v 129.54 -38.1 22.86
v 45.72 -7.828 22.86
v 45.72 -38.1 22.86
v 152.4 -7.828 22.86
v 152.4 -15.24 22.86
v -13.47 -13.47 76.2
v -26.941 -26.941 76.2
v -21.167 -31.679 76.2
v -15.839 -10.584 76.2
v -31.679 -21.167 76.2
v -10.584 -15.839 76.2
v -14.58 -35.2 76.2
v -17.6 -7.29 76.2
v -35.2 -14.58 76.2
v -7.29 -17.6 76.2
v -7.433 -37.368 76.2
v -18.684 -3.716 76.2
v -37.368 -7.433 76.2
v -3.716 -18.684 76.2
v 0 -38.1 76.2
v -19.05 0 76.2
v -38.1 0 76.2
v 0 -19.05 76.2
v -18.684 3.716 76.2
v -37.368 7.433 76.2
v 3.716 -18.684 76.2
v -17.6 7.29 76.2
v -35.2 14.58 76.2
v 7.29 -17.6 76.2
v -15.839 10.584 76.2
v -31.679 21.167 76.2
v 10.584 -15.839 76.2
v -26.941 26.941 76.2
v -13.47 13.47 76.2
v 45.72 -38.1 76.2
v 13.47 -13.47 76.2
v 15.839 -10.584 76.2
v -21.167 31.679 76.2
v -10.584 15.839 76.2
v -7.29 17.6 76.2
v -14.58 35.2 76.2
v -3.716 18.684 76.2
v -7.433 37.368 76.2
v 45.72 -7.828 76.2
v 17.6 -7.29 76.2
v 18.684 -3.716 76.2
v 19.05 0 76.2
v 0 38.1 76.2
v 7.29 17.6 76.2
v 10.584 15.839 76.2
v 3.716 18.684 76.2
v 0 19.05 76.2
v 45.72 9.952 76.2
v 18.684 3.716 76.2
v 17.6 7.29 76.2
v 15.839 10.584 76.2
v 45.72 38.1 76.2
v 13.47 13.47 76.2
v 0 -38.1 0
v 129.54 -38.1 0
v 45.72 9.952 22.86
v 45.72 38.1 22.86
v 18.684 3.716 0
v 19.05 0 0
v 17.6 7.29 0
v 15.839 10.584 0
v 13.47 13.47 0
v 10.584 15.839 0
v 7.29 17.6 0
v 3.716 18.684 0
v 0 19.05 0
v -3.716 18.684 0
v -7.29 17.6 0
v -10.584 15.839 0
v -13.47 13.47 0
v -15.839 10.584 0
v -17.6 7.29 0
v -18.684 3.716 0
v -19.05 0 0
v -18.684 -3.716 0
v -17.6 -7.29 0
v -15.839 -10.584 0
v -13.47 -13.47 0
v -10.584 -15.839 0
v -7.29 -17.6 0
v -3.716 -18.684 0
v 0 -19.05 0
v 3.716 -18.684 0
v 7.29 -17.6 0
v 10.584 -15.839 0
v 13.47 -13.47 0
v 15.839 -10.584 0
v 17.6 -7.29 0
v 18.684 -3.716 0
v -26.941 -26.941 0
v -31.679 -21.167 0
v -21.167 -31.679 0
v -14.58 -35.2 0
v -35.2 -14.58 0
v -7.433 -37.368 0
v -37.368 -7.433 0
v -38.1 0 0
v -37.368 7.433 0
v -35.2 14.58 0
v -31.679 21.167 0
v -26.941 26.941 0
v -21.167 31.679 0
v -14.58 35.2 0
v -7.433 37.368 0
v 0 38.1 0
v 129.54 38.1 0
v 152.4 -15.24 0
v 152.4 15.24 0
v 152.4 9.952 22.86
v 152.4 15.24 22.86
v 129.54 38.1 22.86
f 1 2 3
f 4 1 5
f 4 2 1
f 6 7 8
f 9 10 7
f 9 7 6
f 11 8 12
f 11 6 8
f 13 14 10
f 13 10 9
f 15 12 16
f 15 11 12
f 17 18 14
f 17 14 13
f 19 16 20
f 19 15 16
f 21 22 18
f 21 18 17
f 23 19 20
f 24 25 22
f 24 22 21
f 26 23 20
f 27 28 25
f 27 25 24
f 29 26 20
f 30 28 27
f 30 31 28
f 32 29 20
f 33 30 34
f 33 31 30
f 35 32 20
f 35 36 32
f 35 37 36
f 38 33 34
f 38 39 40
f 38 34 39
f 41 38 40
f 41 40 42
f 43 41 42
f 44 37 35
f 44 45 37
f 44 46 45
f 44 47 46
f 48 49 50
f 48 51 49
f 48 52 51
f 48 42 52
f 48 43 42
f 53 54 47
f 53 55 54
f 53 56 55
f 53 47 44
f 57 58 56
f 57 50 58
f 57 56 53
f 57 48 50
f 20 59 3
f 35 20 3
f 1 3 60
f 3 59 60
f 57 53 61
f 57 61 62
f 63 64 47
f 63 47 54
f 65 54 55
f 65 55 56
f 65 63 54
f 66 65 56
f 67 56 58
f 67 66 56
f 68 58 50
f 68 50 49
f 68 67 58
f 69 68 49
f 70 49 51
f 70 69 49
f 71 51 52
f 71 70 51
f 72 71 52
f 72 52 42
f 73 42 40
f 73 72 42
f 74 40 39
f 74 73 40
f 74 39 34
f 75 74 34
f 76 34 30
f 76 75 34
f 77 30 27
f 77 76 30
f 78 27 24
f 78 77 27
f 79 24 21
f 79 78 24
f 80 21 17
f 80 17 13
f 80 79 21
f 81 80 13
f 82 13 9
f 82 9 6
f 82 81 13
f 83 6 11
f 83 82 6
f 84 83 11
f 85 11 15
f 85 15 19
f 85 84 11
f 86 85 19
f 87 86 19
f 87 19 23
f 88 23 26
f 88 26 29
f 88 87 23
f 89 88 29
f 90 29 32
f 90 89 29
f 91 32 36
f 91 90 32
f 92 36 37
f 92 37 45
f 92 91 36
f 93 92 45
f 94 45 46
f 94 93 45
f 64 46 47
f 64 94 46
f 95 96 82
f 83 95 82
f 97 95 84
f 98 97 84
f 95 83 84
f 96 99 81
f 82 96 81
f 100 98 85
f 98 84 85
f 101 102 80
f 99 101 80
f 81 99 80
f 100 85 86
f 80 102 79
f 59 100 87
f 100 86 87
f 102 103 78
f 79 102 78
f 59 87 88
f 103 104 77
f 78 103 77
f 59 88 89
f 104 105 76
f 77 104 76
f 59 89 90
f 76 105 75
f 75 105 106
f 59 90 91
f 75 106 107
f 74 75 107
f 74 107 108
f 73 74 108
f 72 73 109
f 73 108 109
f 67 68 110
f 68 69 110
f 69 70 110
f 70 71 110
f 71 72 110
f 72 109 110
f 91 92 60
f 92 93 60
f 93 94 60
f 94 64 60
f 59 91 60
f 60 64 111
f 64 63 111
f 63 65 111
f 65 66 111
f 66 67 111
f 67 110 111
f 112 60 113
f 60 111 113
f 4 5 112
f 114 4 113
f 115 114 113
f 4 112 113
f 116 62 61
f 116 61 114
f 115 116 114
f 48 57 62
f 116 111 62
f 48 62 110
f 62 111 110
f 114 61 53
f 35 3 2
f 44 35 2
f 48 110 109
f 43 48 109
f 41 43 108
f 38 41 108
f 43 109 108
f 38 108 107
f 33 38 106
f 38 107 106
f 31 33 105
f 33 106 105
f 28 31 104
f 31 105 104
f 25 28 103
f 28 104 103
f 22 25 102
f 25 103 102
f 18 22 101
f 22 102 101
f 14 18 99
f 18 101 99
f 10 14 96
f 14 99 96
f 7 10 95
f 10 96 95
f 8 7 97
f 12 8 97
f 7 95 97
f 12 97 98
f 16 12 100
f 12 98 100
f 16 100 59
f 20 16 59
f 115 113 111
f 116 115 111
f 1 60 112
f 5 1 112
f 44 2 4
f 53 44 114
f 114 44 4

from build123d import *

# Parameters (mm, degrees)
F0_R     = 19.05
F0_W     = 106.68
F0_H     = 17.78
F1_DEPTH = 76.2
F2_DEPTH = 22.86
F4_DEPTH = 25.4


with BuildPart() as f1:
    # F0 (on Top) → F1 (new body)
    with BuildSketch(Plane.XY):
        with BuildLine():
            Line((45.72, 38.1), (0, 38.1))
            ThreePointArc((0, 38.1), (-38.1, 0), (0, -38.1))
            Line((0, -38.1), (45.72, -38.1))
            Line((45.72, -38.1), (45.72, -7.828155))
            Line((45.72, -7.828155), (45.72, 9.951845))
            Line((45.72, 9.951845), (45.72, 38.1))
        make_face()
        Circle(F0_R, mode=Mode.SUBTRACT)
        with Locations((99.06, 1.061845)):
            Rectangle(F0_W, F0_H)
    extrude(amount=F1_DEPTH)

    # F0 (on Top) → F2 (join)
    with BuildSketch(Plane.XY):
        Polygon((45.72, -7.828155), (45.72, -38.1), (129.54, -38.1), (152.4, -15.24), (152.4, -7.828155), align=None)
        Polygon((129.54, 38.1), (45.72, 38.1), (45.72, 9.951845), (152.4, 9.951845), (152.4, 15.24), align=None)
    extrude(amount=F2_DEPTH)

    # F3 (on face) → F4 (cut)
    with BuildSketch(Plane.XZ.offset(7.828155)):
        Polygon((152.4, 76.2), (45.72, 76.2), (152.4, 22.86), align=None)
    extrude(amount=-F4_DEPTH, mode=Mode.SUBTRACT)


solid = f1.part
